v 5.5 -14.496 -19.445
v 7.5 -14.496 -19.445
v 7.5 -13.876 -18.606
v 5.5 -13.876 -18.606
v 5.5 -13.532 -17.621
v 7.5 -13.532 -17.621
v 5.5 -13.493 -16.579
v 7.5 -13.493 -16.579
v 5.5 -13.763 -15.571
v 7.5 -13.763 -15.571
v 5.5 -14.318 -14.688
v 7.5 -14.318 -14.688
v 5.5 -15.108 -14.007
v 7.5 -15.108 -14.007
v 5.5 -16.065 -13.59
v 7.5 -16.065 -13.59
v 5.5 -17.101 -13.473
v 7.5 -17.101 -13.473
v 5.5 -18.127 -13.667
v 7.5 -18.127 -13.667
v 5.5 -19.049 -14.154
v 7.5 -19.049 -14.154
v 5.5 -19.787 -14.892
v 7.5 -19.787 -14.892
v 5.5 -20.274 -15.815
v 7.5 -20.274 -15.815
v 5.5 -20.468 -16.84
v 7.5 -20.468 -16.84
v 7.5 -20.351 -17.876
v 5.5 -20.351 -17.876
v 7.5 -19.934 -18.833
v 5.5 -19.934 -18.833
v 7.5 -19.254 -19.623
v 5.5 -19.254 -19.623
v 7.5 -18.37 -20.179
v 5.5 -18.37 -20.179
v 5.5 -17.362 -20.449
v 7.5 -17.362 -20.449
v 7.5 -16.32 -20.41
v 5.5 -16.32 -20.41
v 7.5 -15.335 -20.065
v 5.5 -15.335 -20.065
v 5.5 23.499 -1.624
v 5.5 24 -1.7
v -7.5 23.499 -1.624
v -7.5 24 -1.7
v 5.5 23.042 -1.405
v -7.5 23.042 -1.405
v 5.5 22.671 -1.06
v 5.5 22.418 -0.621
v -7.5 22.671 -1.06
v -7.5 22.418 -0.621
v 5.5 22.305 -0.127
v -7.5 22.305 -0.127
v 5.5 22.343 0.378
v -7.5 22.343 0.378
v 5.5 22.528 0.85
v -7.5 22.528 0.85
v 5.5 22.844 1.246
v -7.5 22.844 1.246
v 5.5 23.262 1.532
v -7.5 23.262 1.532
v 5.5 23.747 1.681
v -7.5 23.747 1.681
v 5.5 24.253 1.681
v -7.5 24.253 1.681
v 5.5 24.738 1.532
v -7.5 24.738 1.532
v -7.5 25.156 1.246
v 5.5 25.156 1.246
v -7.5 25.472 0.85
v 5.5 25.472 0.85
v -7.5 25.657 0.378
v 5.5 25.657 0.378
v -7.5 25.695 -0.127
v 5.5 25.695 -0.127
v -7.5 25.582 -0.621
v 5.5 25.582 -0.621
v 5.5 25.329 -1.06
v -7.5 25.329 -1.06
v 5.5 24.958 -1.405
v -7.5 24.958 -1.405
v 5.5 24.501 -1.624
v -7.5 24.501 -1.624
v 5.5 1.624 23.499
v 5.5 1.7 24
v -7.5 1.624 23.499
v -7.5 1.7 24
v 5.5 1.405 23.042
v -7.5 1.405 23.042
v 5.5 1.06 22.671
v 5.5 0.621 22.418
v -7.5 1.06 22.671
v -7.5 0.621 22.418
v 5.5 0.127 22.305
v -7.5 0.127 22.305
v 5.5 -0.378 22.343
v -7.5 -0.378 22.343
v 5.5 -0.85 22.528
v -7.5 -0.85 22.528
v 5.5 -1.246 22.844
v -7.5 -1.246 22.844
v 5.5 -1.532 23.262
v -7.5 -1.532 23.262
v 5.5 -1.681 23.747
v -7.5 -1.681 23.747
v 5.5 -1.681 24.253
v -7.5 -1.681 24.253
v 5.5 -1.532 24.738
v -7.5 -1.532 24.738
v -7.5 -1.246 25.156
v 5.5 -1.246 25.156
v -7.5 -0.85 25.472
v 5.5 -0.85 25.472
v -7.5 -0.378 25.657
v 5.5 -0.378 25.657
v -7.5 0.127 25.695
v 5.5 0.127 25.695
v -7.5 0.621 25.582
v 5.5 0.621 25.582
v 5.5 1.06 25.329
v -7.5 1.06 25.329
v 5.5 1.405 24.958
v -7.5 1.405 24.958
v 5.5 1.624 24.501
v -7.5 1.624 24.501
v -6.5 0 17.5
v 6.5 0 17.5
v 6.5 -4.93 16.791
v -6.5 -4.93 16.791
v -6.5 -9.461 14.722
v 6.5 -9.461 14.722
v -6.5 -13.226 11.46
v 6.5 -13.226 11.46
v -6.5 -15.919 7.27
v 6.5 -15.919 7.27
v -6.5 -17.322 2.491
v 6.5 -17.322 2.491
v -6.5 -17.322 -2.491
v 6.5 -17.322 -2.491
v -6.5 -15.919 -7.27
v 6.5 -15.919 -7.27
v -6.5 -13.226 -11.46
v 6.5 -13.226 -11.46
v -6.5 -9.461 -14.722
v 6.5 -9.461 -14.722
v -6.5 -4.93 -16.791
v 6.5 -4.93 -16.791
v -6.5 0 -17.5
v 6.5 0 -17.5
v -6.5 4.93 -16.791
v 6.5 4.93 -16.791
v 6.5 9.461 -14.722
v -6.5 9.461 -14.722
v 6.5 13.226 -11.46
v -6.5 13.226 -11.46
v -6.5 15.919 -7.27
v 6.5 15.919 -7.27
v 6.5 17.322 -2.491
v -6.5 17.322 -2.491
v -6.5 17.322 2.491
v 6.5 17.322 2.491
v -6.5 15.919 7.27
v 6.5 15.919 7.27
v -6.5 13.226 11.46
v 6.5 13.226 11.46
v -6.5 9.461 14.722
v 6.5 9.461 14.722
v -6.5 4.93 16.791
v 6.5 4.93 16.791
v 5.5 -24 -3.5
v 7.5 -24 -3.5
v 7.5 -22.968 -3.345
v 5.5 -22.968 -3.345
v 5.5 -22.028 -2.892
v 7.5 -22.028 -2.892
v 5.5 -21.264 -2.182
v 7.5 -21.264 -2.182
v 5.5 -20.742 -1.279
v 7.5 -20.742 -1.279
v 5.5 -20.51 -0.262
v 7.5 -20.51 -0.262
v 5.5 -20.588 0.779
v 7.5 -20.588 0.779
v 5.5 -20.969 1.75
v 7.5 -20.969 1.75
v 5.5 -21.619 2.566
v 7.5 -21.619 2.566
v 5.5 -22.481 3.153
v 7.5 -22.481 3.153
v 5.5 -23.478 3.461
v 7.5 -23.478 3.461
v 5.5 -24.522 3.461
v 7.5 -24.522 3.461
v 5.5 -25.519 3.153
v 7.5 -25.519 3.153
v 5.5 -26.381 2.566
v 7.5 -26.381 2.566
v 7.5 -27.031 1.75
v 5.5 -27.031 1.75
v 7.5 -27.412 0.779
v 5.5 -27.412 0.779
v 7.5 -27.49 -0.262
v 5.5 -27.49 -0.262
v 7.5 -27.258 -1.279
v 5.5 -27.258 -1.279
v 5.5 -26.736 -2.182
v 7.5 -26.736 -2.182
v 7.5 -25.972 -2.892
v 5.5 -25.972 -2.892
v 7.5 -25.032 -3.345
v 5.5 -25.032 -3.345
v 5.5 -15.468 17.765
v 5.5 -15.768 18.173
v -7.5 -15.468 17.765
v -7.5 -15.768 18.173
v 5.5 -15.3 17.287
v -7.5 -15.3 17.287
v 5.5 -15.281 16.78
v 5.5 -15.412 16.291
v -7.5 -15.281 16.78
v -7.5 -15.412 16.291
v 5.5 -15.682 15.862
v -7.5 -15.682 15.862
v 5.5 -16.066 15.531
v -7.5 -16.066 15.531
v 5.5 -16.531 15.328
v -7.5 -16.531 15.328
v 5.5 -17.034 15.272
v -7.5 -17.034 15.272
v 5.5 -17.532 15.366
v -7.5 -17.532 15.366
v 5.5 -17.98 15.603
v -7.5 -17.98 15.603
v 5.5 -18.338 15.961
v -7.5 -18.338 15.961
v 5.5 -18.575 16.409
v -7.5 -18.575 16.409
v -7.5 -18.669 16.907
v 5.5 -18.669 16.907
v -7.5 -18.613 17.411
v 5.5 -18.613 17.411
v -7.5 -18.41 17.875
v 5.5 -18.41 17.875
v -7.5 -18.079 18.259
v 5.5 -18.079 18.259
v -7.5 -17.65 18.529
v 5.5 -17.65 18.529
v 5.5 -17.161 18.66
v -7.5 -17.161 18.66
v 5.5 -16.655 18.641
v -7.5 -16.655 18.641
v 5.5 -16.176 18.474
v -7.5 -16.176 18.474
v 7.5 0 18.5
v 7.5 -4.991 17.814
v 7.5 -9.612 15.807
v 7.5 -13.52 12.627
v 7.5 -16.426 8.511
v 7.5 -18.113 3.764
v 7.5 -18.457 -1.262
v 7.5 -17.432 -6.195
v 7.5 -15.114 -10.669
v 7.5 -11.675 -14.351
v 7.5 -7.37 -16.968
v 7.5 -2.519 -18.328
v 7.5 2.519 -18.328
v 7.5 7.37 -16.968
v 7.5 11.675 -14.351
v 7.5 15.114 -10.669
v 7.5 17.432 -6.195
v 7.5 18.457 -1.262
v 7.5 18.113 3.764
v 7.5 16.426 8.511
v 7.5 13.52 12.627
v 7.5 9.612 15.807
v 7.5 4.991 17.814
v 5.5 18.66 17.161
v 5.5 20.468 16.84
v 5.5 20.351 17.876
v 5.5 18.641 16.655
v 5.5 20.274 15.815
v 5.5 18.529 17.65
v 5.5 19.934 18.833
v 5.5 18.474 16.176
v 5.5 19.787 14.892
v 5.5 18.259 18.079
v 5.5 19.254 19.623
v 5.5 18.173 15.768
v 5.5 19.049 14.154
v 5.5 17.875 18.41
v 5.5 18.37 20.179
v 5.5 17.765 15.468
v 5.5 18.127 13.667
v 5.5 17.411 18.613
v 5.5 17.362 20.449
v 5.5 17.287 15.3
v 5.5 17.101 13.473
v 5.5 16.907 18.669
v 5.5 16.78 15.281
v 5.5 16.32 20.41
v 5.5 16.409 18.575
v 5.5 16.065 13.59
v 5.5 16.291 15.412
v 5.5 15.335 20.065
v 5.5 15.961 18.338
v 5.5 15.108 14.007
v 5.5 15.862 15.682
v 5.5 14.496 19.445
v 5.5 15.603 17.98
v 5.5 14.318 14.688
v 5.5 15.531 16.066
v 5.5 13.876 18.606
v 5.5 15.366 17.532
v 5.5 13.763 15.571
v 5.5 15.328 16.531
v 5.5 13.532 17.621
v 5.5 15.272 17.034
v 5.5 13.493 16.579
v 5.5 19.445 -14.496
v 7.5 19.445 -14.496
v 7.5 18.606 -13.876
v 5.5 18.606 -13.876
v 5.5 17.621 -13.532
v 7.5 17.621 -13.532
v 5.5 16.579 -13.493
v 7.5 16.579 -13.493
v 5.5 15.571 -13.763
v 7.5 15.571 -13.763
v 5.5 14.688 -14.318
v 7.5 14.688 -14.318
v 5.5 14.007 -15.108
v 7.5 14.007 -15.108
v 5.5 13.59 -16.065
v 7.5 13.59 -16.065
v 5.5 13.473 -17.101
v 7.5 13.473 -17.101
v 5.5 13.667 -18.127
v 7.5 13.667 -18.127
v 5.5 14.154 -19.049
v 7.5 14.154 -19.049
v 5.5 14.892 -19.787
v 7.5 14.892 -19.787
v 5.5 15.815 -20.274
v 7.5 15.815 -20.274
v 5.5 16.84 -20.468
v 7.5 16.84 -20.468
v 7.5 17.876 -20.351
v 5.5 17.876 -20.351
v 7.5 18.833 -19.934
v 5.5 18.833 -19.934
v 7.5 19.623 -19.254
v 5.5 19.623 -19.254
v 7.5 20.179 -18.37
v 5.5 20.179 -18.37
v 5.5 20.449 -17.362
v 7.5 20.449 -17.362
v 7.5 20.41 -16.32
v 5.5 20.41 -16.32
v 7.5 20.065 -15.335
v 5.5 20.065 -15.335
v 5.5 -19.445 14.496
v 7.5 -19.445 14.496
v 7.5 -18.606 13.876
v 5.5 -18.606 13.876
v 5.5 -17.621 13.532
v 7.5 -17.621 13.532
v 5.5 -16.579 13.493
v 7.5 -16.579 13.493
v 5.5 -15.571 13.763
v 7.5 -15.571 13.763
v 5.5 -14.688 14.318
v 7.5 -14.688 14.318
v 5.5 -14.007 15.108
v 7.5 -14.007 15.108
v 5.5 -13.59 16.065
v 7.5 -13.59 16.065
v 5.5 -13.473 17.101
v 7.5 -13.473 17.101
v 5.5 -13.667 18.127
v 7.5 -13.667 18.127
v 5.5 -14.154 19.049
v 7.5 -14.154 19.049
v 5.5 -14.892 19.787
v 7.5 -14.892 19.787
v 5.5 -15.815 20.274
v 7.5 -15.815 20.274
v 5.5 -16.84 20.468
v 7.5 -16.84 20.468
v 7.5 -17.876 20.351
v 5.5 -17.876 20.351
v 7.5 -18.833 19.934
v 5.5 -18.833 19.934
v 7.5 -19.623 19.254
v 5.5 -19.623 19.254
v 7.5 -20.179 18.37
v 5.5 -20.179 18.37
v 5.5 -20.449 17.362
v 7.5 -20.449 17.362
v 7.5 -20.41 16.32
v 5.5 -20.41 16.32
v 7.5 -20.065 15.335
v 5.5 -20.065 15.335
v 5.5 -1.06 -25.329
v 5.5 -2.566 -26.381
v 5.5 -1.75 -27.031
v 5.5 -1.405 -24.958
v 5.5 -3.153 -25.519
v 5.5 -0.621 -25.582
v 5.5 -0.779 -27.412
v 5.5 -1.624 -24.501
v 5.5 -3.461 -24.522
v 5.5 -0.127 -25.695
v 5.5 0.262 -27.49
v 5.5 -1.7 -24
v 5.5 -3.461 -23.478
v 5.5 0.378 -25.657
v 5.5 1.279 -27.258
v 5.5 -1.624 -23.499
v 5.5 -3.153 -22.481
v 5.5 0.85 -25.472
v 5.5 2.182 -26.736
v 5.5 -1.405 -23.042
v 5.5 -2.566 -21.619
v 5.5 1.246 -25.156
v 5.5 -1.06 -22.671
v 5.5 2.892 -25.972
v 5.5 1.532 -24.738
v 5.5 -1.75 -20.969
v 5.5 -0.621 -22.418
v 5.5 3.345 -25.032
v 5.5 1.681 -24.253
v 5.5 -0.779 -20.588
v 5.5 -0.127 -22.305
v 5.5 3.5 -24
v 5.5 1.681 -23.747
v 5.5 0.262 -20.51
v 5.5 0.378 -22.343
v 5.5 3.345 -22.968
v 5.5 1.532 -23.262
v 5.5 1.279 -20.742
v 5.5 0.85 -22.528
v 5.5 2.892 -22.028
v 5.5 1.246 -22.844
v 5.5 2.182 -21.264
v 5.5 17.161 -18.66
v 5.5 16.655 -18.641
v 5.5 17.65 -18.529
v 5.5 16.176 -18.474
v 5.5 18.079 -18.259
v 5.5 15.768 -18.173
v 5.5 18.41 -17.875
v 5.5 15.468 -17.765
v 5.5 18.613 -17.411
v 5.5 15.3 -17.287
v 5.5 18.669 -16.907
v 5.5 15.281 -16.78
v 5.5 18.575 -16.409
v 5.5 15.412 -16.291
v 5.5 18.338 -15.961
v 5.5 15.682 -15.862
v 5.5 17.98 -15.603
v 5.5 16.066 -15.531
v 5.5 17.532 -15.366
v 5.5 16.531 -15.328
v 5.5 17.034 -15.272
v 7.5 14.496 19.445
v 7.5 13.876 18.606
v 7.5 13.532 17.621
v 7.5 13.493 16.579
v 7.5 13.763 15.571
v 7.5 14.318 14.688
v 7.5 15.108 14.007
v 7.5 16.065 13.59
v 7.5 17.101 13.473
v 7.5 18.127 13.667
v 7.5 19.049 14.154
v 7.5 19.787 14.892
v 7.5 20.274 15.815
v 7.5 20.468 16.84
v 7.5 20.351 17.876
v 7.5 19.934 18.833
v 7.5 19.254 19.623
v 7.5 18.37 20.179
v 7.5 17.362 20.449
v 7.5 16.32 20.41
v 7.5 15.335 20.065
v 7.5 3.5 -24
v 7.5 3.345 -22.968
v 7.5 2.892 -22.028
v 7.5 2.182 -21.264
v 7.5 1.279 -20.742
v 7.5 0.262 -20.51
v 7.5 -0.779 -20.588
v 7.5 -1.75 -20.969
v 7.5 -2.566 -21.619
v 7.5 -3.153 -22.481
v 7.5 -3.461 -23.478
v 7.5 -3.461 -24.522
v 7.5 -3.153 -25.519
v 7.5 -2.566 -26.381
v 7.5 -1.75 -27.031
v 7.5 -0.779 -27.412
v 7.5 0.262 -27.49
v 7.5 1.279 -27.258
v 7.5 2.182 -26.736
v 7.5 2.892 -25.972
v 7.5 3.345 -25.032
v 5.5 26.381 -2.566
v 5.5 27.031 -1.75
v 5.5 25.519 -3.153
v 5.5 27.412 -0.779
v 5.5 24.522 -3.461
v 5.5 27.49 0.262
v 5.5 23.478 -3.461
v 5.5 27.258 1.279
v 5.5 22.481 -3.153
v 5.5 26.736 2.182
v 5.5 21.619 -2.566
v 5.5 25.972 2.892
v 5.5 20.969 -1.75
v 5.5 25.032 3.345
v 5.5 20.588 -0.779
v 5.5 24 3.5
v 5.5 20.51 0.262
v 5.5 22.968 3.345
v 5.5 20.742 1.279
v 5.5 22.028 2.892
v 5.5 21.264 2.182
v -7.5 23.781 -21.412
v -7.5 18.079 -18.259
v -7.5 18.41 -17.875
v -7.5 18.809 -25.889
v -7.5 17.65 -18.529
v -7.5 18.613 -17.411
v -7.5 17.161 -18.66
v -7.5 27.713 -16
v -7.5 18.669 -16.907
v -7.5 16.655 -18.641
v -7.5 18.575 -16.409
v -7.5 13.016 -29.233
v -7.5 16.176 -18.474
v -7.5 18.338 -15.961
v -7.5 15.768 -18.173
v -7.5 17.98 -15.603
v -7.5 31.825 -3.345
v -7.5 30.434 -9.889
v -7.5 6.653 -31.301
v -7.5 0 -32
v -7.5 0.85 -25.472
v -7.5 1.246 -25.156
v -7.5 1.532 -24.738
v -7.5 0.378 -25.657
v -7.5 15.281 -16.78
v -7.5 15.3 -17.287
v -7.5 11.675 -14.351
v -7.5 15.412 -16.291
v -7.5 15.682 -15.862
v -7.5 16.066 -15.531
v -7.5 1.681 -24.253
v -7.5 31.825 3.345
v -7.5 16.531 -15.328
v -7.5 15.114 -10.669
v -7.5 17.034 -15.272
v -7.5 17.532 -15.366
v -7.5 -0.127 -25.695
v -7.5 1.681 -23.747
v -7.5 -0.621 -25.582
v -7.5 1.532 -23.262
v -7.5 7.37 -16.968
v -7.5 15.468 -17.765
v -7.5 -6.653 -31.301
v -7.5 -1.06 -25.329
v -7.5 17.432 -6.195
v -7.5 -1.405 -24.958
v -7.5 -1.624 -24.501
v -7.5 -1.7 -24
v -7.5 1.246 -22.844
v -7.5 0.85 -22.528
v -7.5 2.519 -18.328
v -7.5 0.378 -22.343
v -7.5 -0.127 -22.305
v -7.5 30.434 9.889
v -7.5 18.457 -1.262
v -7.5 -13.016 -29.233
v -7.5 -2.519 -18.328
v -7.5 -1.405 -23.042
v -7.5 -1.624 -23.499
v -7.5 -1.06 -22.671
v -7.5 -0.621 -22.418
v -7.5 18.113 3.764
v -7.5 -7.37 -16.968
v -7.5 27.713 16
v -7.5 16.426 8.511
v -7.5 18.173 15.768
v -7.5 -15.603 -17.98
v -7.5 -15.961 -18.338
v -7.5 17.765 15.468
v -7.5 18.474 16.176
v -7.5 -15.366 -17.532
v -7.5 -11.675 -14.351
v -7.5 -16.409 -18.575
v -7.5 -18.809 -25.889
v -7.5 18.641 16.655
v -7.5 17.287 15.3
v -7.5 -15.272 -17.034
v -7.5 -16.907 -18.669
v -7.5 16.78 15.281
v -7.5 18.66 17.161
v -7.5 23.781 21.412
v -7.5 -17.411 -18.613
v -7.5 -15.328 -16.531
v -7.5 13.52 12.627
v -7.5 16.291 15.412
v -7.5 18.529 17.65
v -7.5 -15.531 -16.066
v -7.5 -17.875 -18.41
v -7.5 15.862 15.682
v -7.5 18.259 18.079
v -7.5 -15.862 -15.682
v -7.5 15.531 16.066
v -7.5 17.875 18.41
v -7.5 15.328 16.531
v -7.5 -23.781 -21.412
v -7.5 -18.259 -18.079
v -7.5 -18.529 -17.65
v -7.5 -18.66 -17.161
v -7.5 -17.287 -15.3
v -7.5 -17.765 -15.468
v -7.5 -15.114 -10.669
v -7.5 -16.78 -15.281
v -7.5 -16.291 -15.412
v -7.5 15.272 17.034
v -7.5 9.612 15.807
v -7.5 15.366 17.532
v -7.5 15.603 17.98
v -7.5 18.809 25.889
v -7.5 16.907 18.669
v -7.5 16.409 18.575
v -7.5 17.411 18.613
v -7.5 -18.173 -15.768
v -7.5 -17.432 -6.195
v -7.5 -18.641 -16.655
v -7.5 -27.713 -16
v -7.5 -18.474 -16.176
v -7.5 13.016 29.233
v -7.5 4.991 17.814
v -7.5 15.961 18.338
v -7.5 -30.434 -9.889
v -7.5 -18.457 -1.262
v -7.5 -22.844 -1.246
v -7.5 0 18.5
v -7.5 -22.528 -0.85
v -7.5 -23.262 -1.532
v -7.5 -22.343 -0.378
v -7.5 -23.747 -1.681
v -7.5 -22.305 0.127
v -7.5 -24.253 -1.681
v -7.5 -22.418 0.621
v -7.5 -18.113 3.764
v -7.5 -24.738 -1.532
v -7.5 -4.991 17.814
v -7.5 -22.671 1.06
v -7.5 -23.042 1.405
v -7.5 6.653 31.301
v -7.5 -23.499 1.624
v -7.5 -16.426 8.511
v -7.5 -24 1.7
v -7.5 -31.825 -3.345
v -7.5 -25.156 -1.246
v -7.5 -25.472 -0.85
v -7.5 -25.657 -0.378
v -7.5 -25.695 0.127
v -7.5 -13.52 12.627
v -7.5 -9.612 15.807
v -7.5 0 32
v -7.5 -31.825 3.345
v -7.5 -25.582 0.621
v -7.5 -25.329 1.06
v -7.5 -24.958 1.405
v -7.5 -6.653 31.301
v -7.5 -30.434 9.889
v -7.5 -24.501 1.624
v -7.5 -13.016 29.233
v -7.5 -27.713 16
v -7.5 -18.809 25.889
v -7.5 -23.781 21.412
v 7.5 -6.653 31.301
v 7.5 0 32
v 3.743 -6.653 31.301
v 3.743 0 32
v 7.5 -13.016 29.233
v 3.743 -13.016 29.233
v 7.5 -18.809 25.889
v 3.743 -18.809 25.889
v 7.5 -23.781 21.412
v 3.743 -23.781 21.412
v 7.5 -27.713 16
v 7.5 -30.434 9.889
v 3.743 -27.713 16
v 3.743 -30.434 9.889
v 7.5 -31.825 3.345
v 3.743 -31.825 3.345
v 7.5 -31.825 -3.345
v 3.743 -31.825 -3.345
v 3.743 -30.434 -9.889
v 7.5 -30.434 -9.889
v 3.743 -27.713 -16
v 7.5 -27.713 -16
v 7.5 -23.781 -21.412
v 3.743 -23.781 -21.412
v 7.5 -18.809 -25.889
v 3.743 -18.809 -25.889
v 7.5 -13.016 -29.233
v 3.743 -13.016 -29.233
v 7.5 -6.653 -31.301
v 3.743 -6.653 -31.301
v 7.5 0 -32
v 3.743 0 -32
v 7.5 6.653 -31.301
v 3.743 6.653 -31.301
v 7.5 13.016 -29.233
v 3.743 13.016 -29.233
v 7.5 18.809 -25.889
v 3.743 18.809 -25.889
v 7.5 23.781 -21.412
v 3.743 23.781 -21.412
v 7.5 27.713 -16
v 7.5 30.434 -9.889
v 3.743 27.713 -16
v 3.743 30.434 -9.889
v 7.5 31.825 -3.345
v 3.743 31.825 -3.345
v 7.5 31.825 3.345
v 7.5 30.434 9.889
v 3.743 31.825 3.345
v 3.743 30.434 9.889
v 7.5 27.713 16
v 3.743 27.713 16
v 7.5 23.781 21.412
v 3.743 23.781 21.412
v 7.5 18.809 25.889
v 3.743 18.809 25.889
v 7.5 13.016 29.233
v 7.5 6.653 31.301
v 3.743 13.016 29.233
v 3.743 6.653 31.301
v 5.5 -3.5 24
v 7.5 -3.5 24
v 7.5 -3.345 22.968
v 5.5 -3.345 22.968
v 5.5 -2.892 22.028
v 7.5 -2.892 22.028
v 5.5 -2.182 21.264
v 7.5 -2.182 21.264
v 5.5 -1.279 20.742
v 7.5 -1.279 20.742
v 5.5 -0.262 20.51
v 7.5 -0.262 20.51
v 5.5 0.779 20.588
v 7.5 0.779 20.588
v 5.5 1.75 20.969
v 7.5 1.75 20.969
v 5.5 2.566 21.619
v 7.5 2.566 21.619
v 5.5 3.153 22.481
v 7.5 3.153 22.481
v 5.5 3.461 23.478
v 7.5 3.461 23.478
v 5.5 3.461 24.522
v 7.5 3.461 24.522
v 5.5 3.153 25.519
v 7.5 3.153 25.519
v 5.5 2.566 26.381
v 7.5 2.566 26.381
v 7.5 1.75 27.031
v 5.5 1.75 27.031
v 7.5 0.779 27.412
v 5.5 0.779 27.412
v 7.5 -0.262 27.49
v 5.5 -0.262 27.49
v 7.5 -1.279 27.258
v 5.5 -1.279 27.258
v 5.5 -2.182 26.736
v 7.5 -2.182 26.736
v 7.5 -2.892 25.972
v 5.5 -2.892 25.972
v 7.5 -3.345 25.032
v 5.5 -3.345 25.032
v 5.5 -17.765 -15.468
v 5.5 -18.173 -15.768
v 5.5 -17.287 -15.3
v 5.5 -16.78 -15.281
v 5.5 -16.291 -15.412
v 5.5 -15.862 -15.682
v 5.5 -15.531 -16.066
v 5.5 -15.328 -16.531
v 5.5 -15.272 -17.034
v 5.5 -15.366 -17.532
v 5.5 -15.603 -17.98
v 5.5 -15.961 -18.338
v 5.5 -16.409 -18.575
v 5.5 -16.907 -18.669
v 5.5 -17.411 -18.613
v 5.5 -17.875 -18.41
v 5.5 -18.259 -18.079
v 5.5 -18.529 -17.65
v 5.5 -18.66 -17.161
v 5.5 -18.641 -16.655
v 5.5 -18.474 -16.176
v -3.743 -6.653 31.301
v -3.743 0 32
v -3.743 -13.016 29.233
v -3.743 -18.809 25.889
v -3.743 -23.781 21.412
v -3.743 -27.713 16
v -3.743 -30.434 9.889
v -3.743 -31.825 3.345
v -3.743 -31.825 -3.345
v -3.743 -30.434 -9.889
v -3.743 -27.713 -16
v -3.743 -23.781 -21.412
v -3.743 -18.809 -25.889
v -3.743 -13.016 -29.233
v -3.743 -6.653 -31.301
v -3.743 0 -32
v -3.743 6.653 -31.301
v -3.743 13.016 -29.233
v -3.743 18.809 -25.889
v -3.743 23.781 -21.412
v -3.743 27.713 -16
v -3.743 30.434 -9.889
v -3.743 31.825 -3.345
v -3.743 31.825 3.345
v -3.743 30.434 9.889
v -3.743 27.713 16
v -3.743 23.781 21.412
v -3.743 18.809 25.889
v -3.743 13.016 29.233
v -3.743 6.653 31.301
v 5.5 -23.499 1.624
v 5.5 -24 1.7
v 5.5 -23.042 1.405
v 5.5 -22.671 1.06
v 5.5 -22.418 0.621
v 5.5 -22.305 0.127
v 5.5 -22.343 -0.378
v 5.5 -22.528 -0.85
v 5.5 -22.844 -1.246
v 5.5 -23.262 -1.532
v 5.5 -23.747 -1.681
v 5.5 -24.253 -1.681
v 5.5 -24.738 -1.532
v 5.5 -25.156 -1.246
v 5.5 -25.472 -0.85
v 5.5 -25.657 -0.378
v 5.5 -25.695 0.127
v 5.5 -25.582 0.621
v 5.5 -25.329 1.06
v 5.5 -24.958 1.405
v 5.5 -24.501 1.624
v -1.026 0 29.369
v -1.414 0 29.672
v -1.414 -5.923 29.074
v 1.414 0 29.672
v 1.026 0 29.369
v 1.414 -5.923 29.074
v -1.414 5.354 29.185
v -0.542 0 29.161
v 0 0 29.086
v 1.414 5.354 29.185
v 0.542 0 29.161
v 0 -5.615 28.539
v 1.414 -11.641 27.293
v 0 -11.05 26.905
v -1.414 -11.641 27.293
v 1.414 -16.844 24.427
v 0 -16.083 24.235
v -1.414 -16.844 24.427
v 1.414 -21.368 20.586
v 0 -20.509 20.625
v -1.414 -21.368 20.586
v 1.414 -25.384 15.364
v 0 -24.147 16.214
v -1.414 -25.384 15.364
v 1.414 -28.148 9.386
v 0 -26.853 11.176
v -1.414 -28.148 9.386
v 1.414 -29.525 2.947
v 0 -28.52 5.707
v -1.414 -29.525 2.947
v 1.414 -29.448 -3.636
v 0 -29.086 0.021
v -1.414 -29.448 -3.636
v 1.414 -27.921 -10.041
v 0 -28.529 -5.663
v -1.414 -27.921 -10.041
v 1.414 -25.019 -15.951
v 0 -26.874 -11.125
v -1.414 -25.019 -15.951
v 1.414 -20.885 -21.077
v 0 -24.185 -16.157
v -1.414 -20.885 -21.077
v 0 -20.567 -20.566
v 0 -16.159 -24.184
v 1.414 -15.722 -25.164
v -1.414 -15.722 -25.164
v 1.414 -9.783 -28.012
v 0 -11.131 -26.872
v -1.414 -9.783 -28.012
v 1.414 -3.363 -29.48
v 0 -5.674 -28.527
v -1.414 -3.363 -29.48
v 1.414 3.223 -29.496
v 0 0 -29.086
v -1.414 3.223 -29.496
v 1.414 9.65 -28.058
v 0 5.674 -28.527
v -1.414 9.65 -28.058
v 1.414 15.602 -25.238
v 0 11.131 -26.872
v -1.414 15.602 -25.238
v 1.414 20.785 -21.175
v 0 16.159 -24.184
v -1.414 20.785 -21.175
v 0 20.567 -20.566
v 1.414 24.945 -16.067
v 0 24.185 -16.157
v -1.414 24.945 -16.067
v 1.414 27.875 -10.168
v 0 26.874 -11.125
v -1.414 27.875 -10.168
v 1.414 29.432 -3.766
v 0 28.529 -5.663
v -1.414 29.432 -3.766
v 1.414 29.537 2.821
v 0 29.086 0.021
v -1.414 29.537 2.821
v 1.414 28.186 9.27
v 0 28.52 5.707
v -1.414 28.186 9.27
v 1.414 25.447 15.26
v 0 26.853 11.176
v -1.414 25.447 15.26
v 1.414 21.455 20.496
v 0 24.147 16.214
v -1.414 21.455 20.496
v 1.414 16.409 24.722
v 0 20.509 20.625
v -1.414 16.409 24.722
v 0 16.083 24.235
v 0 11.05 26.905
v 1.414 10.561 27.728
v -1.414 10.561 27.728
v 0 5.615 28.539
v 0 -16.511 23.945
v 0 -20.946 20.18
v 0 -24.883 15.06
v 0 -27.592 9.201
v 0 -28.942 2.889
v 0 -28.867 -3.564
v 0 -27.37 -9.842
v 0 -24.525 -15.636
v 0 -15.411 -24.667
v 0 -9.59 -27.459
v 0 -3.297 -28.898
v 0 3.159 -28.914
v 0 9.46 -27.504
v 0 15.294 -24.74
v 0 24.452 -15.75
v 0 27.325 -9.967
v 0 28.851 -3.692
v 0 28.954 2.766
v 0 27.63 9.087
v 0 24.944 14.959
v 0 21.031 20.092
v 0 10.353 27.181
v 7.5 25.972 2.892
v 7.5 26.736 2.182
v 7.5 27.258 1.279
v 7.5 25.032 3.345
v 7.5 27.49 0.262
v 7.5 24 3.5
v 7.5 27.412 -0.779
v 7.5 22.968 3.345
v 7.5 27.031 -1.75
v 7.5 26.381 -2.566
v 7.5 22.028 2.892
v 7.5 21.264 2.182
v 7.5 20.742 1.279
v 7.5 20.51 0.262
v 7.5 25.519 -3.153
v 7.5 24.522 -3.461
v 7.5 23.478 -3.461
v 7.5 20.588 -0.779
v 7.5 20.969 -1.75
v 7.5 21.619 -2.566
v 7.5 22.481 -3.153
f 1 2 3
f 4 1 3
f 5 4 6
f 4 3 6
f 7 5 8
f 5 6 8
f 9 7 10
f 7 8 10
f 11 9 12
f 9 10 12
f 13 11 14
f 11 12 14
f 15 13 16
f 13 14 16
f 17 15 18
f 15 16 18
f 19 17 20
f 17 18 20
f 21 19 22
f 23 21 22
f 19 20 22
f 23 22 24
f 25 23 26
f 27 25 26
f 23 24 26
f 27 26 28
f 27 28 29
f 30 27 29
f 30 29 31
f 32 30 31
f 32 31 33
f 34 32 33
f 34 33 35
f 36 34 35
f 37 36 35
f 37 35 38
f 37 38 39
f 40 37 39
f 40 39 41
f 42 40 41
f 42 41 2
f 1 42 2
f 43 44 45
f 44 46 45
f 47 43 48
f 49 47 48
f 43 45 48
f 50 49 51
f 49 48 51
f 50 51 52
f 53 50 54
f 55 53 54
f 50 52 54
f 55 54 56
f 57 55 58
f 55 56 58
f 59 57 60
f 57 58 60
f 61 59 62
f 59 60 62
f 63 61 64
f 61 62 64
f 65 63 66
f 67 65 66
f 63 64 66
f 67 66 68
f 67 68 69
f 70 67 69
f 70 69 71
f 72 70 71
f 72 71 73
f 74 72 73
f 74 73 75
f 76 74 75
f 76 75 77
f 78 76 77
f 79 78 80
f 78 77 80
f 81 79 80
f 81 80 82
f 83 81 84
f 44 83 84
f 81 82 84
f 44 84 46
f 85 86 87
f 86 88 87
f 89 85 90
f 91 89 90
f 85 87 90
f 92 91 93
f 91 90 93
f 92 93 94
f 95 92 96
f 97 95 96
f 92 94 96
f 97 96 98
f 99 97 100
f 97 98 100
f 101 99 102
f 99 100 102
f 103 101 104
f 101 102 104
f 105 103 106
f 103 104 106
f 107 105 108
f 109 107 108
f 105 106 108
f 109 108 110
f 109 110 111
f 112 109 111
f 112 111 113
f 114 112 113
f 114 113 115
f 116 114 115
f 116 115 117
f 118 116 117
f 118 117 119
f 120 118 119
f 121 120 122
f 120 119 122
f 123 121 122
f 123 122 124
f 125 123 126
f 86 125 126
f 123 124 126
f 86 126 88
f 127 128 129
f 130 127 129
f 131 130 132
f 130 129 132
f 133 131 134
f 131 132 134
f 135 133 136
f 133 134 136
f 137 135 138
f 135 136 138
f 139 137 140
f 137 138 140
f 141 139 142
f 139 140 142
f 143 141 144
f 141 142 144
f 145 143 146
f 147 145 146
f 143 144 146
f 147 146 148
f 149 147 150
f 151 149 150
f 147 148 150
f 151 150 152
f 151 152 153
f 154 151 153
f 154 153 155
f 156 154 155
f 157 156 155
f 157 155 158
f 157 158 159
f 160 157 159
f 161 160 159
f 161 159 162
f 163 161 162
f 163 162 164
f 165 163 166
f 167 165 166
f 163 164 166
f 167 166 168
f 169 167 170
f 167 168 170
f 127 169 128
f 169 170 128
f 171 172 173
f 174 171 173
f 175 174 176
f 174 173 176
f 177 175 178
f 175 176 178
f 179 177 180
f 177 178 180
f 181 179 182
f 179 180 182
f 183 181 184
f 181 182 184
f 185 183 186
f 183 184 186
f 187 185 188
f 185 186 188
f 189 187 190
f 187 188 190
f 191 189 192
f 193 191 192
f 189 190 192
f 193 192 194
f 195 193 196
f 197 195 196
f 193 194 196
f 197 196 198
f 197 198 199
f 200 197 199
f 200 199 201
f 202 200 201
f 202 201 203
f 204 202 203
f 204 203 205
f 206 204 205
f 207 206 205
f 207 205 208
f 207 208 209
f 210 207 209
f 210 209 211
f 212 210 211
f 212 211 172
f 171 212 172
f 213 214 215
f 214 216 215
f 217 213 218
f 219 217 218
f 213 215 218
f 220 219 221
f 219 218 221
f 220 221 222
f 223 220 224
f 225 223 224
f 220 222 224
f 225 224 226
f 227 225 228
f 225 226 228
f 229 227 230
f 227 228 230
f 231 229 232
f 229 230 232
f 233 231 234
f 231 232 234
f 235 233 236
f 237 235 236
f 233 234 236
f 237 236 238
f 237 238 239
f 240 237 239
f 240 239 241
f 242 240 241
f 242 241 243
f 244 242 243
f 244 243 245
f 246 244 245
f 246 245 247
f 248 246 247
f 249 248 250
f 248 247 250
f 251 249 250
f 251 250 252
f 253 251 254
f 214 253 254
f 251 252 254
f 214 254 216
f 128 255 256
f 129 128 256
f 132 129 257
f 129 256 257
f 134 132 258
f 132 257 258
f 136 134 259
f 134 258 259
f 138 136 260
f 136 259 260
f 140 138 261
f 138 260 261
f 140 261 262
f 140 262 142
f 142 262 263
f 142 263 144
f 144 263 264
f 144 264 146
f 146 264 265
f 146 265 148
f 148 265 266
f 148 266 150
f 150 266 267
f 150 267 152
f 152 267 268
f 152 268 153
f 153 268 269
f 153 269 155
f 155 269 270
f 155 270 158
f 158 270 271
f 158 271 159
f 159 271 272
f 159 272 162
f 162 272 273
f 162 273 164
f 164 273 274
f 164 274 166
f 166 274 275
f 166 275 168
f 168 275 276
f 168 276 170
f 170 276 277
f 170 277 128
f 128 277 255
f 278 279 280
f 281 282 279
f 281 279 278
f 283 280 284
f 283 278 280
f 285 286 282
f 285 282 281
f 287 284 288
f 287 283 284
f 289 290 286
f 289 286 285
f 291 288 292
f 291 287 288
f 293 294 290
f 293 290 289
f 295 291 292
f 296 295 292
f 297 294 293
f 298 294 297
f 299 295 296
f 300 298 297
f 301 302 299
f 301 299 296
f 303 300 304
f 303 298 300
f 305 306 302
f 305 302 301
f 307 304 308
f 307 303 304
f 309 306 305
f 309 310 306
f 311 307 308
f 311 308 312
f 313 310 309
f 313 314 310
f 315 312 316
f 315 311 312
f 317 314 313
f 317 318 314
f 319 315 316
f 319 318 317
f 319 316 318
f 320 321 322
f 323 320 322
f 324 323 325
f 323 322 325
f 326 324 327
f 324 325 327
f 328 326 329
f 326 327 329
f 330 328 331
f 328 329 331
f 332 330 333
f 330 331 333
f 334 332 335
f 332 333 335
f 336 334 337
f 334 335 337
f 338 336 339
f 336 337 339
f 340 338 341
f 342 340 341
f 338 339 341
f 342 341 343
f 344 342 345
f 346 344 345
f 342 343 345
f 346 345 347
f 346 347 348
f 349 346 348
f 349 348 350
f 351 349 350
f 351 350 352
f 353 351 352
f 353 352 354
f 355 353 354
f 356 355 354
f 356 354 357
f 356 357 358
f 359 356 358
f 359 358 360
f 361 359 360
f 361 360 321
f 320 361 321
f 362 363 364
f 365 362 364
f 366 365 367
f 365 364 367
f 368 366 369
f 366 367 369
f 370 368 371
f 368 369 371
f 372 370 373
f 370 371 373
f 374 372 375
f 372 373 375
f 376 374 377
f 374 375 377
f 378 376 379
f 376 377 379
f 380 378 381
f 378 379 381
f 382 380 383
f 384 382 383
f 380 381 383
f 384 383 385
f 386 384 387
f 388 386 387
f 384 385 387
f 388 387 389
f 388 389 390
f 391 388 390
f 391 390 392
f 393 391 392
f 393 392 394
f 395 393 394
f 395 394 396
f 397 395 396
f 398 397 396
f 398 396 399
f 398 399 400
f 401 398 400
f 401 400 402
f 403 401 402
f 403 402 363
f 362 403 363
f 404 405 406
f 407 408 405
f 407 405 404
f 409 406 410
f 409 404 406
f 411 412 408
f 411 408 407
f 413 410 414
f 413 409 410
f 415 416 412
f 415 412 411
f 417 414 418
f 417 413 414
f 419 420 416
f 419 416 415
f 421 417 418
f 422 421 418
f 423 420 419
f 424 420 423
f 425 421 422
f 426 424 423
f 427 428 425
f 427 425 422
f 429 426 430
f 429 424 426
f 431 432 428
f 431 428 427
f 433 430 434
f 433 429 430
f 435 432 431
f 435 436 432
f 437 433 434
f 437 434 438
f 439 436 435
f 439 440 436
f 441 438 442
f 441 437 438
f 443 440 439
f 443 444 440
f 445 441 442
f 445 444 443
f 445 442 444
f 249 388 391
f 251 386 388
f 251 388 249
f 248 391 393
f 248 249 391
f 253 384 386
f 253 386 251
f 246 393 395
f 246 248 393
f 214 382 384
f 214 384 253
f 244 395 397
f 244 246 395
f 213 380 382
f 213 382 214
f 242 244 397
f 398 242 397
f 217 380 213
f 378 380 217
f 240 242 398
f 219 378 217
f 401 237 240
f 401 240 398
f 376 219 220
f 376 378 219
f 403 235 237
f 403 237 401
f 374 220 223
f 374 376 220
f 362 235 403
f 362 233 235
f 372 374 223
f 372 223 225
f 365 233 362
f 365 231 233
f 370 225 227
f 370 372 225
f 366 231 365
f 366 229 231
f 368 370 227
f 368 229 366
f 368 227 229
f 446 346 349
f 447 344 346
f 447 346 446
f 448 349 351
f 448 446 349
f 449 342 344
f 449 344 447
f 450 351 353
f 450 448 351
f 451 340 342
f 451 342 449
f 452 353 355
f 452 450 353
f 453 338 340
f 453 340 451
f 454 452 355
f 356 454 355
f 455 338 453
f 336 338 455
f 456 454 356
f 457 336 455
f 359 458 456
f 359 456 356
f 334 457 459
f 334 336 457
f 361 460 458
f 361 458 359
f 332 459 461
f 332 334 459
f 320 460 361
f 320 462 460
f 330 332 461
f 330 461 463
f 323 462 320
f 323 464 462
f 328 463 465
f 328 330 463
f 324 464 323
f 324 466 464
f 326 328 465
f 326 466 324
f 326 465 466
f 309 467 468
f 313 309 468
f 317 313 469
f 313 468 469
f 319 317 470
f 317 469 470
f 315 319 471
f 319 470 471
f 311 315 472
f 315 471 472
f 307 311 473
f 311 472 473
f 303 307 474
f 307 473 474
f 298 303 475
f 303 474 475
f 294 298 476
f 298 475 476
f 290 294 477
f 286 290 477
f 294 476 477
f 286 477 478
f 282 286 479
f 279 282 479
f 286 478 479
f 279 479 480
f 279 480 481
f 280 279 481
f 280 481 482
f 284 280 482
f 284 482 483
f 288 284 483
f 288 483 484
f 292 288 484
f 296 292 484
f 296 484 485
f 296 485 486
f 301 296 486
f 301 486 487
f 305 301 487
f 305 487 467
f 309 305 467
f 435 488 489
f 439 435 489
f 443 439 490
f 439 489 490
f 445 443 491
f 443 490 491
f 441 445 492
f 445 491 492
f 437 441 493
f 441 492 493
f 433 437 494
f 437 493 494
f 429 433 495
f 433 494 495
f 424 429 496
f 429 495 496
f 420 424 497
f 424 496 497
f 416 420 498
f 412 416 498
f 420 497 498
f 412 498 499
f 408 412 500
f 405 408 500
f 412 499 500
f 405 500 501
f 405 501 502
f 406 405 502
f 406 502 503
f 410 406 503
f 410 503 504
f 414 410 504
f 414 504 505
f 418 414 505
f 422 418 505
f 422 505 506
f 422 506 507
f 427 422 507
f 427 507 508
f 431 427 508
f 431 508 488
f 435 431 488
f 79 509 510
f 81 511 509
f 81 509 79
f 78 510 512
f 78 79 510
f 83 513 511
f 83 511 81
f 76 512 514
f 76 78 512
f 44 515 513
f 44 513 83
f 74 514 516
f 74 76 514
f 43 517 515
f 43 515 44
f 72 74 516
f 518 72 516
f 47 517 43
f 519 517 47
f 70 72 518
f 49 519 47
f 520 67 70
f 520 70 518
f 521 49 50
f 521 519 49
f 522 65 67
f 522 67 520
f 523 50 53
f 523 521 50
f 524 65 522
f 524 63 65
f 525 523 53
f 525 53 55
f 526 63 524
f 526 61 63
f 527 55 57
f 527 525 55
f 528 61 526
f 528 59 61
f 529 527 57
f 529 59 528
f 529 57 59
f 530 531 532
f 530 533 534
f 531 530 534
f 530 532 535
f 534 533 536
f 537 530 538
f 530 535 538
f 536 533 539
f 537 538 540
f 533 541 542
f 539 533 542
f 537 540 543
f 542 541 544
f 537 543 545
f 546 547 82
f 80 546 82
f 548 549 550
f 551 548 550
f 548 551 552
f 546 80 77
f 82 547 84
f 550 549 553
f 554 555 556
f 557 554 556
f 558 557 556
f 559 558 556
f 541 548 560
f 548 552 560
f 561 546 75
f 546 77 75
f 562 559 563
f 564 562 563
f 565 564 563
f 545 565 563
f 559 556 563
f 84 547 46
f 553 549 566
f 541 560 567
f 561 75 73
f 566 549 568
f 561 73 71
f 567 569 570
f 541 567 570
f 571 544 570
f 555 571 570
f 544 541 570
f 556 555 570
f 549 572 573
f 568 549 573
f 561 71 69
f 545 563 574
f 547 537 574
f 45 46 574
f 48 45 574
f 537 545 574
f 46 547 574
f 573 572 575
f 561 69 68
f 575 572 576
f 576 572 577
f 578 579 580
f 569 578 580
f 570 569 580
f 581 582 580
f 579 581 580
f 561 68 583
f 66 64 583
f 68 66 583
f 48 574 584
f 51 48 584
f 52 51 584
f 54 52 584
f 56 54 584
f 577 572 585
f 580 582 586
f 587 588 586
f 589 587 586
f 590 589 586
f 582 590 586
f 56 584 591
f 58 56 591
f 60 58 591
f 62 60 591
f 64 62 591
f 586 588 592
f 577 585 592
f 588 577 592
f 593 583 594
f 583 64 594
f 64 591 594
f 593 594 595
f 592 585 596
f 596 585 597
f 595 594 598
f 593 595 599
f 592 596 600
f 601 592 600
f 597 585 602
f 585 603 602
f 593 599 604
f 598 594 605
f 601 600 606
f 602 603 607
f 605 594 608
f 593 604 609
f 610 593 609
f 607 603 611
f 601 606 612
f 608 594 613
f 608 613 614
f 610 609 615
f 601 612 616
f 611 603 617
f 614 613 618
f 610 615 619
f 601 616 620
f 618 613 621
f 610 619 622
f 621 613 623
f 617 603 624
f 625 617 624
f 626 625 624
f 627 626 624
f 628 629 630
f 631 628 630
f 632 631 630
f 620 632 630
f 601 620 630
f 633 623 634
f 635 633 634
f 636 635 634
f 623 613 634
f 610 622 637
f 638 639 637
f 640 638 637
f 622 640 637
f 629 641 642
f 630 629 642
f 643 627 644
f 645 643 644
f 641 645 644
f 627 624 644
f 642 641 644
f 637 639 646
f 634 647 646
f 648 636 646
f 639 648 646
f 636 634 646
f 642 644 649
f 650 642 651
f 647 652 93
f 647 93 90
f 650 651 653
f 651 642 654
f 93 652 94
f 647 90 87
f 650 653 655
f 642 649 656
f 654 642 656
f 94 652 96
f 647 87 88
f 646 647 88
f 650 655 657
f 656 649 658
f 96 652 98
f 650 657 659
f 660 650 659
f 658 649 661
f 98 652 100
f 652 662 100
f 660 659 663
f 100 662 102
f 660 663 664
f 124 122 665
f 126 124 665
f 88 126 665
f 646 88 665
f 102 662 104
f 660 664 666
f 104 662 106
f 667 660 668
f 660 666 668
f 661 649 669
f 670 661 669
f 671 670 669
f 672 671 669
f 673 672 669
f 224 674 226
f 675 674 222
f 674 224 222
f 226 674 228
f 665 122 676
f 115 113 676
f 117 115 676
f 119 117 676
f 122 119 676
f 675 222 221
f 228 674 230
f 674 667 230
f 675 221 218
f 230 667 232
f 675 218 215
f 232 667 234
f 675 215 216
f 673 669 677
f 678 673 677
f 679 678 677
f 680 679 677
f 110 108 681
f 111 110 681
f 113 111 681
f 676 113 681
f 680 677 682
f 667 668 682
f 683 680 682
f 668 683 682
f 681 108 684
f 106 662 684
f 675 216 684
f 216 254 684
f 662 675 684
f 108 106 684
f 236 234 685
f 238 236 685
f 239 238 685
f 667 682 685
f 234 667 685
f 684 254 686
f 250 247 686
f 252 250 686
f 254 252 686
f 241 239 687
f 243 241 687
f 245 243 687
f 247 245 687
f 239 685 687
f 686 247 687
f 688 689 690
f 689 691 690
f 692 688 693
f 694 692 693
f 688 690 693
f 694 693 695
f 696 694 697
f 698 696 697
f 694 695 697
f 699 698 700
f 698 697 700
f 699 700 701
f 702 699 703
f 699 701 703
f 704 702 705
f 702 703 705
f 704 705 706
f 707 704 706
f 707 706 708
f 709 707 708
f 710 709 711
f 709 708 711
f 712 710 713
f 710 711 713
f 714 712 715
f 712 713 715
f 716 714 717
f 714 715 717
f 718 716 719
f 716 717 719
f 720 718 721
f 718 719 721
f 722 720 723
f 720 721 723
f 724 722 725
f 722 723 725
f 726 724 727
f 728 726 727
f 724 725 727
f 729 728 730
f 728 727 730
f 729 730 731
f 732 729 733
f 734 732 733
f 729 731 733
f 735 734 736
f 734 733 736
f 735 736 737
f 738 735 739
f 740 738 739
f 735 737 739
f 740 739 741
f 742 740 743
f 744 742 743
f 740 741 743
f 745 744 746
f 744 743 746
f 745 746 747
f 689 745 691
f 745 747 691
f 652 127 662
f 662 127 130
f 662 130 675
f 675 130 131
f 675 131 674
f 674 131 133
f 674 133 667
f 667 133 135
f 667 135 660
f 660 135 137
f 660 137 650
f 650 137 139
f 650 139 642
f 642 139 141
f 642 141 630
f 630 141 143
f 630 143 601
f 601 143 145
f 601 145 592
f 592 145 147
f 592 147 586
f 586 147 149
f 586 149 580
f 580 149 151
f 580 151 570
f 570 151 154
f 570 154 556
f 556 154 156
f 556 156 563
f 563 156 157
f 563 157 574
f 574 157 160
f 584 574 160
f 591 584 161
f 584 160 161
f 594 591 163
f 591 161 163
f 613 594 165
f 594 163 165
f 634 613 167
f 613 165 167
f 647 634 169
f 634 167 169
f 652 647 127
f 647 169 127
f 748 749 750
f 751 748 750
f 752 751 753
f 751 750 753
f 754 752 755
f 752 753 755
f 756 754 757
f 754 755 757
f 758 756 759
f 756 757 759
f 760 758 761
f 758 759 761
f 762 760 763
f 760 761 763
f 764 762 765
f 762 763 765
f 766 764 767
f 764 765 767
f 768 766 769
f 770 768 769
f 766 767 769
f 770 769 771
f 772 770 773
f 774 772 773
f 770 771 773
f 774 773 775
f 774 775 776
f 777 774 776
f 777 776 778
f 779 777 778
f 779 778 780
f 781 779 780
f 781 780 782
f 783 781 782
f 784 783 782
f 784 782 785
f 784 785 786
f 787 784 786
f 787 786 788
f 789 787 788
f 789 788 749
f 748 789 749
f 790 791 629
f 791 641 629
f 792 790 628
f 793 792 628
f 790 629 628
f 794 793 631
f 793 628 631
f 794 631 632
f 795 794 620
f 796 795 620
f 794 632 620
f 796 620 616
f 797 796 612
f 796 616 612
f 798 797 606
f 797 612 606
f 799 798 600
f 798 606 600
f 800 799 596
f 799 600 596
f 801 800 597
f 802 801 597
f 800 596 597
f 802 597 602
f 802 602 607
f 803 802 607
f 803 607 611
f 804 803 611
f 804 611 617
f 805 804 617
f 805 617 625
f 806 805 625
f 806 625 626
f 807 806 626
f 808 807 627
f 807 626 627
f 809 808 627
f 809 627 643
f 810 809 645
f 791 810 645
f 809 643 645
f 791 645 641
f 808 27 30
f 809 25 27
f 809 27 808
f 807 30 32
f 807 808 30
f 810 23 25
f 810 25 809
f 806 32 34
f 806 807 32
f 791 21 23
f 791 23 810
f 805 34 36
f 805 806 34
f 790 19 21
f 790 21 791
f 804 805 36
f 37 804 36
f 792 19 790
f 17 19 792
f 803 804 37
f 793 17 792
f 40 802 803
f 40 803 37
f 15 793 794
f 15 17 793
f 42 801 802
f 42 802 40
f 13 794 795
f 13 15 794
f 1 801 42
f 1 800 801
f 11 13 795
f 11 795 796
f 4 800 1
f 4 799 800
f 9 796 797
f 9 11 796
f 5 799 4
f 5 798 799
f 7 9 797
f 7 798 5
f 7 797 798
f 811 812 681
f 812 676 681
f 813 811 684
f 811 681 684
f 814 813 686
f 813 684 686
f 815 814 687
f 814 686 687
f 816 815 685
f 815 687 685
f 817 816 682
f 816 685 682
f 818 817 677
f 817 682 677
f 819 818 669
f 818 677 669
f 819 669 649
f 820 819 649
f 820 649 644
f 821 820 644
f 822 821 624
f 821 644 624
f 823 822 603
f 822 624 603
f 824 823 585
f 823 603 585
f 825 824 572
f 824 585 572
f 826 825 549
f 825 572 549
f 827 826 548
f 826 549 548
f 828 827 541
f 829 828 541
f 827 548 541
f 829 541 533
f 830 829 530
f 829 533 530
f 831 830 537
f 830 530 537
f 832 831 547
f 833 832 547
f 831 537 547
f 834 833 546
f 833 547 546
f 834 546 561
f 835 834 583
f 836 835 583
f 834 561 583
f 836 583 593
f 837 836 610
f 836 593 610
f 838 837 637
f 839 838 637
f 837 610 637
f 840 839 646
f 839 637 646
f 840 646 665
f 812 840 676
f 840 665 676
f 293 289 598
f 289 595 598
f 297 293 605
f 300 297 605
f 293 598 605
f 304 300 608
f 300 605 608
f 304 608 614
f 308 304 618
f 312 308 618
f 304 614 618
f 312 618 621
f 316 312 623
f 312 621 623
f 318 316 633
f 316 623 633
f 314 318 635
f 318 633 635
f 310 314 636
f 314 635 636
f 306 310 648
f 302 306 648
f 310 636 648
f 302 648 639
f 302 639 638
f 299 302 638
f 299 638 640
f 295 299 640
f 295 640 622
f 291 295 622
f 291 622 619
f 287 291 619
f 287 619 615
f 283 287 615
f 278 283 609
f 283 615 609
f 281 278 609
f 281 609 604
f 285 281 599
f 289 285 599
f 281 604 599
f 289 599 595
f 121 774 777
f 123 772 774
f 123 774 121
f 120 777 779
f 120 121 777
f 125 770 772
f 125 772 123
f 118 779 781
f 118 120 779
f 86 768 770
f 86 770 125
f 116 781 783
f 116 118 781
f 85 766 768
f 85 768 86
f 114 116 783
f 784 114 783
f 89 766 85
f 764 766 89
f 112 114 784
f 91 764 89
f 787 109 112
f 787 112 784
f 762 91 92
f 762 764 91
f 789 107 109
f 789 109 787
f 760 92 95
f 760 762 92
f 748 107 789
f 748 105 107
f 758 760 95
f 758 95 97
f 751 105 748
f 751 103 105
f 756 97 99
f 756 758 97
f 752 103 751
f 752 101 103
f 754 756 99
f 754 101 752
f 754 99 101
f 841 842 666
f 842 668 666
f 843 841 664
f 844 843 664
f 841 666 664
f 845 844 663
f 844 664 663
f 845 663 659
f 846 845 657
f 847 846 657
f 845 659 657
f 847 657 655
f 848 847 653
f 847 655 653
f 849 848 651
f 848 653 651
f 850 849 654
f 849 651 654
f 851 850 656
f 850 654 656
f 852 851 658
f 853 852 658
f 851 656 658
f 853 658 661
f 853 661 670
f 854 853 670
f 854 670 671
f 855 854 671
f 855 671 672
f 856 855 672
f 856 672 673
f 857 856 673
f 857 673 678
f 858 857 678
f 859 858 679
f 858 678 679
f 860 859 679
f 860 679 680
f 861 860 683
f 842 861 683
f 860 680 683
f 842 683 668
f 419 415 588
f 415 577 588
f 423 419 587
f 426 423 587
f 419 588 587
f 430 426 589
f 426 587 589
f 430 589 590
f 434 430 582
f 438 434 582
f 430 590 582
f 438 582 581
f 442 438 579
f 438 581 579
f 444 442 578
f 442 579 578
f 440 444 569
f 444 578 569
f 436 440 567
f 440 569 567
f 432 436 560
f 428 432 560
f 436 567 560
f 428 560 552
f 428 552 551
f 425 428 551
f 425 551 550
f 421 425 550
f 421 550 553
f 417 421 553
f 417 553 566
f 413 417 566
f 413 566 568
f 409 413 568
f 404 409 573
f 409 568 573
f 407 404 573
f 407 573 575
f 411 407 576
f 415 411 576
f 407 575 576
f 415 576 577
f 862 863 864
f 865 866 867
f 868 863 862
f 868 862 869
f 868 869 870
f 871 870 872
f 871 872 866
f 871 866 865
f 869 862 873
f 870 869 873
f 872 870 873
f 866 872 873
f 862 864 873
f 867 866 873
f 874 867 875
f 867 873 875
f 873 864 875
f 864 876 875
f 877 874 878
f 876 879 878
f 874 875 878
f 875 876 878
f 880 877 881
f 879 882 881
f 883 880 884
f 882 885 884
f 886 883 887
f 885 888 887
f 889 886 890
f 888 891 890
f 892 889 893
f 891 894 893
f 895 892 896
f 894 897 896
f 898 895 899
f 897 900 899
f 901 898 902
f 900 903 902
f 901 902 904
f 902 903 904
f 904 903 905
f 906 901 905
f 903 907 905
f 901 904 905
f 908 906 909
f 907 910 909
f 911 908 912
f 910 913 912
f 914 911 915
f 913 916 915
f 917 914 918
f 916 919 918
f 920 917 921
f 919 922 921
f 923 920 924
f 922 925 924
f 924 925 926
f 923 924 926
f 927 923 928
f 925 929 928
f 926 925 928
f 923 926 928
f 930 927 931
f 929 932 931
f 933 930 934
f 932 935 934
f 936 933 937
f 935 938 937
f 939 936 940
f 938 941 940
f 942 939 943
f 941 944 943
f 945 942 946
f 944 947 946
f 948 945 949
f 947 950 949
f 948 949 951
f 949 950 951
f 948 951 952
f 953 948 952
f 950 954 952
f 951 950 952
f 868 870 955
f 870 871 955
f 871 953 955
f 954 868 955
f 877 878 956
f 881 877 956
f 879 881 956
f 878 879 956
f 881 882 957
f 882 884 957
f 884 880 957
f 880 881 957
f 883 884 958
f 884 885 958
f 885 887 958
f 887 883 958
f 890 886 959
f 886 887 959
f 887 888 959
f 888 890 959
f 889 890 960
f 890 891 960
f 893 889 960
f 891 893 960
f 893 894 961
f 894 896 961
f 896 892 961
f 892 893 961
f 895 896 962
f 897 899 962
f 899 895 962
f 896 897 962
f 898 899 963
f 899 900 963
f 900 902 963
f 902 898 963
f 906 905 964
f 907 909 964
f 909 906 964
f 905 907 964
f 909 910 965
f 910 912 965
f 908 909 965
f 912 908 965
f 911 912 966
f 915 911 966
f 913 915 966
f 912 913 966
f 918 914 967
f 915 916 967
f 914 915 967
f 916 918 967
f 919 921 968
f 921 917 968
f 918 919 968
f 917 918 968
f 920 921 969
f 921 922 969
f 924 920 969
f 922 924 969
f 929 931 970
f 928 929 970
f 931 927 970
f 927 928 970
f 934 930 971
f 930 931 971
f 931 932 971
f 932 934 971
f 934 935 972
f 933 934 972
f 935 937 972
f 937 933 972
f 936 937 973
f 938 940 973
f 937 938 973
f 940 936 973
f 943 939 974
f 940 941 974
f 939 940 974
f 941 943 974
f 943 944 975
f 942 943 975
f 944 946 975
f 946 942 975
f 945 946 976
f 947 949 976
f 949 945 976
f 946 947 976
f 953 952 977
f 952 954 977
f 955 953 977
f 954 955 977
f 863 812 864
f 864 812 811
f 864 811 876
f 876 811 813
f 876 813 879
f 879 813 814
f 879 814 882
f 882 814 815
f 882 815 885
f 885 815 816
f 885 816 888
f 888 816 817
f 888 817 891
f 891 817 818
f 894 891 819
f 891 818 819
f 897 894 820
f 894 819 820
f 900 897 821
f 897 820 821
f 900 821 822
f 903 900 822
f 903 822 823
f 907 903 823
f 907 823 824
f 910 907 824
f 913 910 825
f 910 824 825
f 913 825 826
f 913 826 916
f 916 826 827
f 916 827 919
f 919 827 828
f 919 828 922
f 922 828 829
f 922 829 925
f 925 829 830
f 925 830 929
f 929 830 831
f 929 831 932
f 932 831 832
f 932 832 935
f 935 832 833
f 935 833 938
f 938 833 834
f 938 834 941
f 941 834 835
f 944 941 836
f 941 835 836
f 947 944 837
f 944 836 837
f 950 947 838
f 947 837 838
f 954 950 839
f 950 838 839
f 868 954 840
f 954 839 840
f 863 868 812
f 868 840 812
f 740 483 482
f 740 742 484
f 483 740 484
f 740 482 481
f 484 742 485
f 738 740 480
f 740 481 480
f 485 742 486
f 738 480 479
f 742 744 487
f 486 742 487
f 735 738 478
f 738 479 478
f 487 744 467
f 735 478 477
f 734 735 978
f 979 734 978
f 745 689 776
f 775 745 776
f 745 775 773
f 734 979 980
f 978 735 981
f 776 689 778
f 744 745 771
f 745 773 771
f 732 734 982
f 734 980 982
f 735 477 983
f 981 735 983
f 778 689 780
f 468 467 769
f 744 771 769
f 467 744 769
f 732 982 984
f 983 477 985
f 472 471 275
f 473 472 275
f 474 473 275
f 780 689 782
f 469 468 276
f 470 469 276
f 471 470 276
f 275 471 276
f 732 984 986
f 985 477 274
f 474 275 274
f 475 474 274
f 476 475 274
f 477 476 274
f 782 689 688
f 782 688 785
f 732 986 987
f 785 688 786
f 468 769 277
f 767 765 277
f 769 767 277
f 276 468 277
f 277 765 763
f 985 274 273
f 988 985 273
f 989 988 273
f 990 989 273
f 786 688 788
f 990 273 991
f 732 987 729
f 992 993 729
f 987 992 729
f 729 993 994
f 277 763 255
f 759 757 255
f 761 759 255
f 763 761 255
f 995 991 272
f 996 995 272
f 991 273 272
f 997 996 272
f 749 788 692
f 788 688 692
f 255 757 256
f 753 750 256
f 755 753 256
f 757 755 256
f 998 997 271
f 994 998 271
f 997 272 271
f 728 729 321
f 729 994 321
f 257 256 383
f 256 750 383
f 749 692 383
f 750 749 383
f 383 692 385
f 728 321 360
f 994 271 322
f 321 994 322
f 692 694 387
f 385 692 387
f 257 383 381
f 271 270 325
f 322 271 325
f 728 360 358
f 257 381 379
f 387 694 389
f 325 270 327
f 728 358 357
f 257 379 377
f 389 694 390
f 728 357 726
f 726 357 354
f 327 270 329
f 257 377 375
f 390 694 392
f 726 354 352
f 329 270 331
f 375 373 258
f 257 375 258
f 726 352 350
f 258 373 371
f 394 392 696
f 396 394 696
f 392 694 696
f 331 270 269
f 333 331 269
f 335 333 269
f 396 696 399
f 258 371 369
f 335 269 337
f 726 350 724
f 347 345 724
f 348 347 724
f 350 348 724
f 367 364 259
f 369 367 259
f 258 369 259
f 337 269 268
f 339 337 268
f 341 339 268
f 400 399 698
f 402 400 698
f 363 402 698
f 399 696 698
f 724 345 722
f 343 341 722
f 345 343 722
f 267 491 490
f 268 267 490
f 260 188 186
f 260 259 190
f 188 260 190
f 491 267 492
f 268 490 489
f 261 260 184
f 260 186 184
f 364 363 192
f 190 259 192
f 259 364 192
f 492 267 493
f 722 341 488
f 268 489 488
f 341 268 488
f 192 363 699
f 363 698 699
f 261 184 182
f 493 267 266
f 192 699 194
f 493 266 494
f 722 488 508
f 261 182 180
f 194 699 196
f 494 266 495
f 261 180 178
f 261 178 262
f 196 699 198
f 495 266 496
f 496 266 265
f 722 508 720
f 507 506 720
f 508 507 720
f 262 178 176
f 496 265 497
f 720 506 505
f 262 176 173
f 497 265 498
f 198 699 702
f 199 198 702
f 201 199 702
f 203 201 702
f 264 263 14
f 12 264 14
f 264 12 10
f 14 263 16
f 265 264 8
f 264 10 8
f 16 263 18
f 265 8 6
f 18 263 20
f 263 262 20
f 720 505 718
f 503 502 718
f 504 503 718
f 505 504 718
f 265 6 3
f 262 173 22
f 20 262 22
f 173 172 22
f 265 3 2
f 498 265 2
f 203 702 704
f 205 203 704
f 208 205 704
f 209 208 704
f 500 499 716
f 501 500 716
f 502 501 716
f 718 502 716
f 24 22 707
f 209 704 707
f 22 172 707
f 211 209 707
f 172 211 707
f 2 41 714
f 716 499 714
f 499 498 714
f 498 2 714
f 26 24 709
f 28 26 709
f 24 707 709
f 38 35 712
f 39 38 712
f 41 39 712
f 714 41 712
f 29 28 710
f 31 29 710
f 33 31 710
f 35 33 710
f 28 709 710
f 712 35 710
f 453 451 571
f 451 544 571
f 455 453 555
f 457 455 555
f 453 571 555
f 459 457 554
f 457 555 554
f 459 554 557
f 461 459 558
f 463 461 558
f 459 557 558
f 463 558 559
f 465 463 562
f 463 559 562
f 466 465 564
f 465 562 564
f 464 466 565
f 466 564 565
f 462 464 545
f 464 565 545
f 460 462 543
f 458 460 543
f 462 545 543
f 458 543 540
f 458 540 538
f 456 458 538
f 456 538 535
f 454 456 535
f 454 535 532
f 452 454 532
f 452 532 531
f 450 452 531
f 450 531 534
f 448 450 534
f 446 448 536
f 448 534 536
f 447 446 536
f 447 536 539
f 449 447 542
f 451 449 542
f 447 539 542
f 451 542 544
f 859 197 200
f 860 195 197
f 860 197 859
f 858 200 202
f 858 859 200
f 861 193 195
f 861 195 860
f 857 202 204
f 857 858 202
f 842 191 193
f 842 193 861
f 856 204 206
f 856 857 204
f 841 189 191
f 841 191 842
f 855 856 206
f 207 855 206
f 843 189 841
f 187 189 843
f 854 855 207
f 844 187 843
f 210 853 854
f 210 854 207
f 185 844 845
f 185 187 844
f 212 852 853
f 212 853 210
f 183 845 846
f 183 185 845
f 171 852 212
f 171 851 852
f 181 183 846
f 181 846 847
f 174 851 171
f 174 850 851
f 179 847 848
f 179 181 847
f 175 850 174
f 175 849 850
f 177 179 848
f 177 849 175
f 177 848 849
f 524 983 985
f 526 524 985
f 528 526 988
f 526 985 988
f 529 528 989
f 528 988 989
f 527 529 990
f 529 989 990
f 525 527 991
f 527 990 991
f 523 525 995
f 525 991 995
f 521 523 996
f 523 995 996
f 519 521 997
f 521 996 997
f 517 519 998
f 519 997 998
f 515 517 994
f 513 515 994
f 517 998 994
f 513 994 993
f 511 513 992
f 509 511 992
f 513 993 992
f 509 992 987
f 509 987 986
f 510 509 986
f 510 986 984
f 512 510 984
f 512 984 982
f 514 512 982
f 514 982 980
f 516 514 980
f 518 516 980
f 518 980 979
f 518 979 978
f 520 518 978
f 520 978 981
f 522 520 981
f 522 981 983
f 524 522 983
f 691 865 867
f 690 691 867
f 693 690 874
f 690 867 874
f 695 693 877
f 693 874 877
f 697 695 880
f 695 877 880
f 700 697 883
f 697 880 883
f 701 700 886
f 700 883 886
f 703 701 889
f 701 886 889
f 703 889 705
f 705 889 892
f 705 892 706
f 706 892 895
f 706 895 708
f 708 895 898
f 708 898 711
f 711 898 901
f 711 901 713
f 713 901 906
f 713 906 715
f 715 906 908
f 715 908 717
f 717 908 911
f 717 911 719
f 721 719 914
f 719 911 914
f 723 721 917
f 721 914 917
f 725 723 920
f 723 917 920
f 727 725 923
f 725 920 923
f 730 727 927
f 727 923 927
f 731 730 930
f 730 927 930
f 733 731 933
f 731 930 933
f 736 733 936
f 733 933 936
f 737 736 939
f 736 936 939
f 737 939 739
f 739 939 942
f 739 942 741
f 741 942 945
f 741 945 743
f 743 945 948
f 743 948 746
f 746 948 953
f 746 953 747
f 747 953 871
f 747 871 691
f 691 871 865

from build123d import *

# Parameters (mm, degrees)
CHAMFER1_SIZE                                = 1
FILLET1_R                                    = 2
CBORE_FOR_M3_HEX_HEAD_CAP_SCREW1_D           = 3.4
CBORE_FOR_M3_HEX_HEAD_CAP_SCREW1_CBORE_D     = 7
CBORE_FOR_M3_HEX_HEAD_CAP_SCREW1_CBORE_DEPTH = 2
CIRPATTERN1_COUNT                            = 8


with BuildPart() as part:
    # Sketch1 → Revolve1 (revolve)
    with BuildSketch(Plane.XY, mode=Mode.PRIVATE) as revolve1_sk:
        Polygon((7.5, 32), (3.742640687, 32), (0, 28.257359313), (-3.742640687, 32), (-7.5, 32), (-7.5, 17.5), (7.5, 17.5), align=None)
    revolve(revolve1_sk.sketch.rotate(Axis((-33.732241936, 0, 0), (1, 0, 0)), 90), axis=Axis((-33.732241936, 0, 0), (1, 0, 0)))

    # Chamfer1
    chamfer1_edges = [part.edges().sort_by_distance(p)[0] for p in [
        (7.5, 0, -17.5),
        (-7.5, 0, -17.5),
    ]]
    chamfer(chamfer1_edges, length=CHAMFER1_SIZE)

    # Fillet1
    fillet1_edges = [part.edges().sort_by_distance(p)[0] for p in [
        (0, 0, -28.257359313),
    ]]
    fillet(fillet1_edges, radius=FILLET1_R)

    # CBORE for M3 Hex Head Cap Screw1 (through all)
    with Locations(Plane(origin=(7.5, 24, 0), x_dir=(0, 0, 1), z_dir=(1, 0, 0))):
        with Locations((0, 0)):
            cbore_for_m3_hex_head_cap_screw1 = CounterBoreHole(CBORE_FOR_M3_HEX_HEAD_CAP_SCREW1_D / 2, CBORE_FOR_M3_HEX_HEAD_CAP_SCREW1_CBORE_D / 2, CBORE_FOR_M3_HEX_HEAD_CAP_SCREW1_CBORE_DEPTH)

    # CirPattern1: CBORE for M3 Hex Head Cap Screw1 ×8 about axis
    cirpattern1_axis = Axis((0, 0, 0), (1, 0, 0))
    for i in range(1, CIRPATTERN1_COUNT):
        add(cbore_for_m3_hex_head_cap_screw1.rotate(cirpattern1_axis, i * 360 / CIRPATTERN1_COUNT), mode=Mode.SUBTRACT)


solid = part.part
